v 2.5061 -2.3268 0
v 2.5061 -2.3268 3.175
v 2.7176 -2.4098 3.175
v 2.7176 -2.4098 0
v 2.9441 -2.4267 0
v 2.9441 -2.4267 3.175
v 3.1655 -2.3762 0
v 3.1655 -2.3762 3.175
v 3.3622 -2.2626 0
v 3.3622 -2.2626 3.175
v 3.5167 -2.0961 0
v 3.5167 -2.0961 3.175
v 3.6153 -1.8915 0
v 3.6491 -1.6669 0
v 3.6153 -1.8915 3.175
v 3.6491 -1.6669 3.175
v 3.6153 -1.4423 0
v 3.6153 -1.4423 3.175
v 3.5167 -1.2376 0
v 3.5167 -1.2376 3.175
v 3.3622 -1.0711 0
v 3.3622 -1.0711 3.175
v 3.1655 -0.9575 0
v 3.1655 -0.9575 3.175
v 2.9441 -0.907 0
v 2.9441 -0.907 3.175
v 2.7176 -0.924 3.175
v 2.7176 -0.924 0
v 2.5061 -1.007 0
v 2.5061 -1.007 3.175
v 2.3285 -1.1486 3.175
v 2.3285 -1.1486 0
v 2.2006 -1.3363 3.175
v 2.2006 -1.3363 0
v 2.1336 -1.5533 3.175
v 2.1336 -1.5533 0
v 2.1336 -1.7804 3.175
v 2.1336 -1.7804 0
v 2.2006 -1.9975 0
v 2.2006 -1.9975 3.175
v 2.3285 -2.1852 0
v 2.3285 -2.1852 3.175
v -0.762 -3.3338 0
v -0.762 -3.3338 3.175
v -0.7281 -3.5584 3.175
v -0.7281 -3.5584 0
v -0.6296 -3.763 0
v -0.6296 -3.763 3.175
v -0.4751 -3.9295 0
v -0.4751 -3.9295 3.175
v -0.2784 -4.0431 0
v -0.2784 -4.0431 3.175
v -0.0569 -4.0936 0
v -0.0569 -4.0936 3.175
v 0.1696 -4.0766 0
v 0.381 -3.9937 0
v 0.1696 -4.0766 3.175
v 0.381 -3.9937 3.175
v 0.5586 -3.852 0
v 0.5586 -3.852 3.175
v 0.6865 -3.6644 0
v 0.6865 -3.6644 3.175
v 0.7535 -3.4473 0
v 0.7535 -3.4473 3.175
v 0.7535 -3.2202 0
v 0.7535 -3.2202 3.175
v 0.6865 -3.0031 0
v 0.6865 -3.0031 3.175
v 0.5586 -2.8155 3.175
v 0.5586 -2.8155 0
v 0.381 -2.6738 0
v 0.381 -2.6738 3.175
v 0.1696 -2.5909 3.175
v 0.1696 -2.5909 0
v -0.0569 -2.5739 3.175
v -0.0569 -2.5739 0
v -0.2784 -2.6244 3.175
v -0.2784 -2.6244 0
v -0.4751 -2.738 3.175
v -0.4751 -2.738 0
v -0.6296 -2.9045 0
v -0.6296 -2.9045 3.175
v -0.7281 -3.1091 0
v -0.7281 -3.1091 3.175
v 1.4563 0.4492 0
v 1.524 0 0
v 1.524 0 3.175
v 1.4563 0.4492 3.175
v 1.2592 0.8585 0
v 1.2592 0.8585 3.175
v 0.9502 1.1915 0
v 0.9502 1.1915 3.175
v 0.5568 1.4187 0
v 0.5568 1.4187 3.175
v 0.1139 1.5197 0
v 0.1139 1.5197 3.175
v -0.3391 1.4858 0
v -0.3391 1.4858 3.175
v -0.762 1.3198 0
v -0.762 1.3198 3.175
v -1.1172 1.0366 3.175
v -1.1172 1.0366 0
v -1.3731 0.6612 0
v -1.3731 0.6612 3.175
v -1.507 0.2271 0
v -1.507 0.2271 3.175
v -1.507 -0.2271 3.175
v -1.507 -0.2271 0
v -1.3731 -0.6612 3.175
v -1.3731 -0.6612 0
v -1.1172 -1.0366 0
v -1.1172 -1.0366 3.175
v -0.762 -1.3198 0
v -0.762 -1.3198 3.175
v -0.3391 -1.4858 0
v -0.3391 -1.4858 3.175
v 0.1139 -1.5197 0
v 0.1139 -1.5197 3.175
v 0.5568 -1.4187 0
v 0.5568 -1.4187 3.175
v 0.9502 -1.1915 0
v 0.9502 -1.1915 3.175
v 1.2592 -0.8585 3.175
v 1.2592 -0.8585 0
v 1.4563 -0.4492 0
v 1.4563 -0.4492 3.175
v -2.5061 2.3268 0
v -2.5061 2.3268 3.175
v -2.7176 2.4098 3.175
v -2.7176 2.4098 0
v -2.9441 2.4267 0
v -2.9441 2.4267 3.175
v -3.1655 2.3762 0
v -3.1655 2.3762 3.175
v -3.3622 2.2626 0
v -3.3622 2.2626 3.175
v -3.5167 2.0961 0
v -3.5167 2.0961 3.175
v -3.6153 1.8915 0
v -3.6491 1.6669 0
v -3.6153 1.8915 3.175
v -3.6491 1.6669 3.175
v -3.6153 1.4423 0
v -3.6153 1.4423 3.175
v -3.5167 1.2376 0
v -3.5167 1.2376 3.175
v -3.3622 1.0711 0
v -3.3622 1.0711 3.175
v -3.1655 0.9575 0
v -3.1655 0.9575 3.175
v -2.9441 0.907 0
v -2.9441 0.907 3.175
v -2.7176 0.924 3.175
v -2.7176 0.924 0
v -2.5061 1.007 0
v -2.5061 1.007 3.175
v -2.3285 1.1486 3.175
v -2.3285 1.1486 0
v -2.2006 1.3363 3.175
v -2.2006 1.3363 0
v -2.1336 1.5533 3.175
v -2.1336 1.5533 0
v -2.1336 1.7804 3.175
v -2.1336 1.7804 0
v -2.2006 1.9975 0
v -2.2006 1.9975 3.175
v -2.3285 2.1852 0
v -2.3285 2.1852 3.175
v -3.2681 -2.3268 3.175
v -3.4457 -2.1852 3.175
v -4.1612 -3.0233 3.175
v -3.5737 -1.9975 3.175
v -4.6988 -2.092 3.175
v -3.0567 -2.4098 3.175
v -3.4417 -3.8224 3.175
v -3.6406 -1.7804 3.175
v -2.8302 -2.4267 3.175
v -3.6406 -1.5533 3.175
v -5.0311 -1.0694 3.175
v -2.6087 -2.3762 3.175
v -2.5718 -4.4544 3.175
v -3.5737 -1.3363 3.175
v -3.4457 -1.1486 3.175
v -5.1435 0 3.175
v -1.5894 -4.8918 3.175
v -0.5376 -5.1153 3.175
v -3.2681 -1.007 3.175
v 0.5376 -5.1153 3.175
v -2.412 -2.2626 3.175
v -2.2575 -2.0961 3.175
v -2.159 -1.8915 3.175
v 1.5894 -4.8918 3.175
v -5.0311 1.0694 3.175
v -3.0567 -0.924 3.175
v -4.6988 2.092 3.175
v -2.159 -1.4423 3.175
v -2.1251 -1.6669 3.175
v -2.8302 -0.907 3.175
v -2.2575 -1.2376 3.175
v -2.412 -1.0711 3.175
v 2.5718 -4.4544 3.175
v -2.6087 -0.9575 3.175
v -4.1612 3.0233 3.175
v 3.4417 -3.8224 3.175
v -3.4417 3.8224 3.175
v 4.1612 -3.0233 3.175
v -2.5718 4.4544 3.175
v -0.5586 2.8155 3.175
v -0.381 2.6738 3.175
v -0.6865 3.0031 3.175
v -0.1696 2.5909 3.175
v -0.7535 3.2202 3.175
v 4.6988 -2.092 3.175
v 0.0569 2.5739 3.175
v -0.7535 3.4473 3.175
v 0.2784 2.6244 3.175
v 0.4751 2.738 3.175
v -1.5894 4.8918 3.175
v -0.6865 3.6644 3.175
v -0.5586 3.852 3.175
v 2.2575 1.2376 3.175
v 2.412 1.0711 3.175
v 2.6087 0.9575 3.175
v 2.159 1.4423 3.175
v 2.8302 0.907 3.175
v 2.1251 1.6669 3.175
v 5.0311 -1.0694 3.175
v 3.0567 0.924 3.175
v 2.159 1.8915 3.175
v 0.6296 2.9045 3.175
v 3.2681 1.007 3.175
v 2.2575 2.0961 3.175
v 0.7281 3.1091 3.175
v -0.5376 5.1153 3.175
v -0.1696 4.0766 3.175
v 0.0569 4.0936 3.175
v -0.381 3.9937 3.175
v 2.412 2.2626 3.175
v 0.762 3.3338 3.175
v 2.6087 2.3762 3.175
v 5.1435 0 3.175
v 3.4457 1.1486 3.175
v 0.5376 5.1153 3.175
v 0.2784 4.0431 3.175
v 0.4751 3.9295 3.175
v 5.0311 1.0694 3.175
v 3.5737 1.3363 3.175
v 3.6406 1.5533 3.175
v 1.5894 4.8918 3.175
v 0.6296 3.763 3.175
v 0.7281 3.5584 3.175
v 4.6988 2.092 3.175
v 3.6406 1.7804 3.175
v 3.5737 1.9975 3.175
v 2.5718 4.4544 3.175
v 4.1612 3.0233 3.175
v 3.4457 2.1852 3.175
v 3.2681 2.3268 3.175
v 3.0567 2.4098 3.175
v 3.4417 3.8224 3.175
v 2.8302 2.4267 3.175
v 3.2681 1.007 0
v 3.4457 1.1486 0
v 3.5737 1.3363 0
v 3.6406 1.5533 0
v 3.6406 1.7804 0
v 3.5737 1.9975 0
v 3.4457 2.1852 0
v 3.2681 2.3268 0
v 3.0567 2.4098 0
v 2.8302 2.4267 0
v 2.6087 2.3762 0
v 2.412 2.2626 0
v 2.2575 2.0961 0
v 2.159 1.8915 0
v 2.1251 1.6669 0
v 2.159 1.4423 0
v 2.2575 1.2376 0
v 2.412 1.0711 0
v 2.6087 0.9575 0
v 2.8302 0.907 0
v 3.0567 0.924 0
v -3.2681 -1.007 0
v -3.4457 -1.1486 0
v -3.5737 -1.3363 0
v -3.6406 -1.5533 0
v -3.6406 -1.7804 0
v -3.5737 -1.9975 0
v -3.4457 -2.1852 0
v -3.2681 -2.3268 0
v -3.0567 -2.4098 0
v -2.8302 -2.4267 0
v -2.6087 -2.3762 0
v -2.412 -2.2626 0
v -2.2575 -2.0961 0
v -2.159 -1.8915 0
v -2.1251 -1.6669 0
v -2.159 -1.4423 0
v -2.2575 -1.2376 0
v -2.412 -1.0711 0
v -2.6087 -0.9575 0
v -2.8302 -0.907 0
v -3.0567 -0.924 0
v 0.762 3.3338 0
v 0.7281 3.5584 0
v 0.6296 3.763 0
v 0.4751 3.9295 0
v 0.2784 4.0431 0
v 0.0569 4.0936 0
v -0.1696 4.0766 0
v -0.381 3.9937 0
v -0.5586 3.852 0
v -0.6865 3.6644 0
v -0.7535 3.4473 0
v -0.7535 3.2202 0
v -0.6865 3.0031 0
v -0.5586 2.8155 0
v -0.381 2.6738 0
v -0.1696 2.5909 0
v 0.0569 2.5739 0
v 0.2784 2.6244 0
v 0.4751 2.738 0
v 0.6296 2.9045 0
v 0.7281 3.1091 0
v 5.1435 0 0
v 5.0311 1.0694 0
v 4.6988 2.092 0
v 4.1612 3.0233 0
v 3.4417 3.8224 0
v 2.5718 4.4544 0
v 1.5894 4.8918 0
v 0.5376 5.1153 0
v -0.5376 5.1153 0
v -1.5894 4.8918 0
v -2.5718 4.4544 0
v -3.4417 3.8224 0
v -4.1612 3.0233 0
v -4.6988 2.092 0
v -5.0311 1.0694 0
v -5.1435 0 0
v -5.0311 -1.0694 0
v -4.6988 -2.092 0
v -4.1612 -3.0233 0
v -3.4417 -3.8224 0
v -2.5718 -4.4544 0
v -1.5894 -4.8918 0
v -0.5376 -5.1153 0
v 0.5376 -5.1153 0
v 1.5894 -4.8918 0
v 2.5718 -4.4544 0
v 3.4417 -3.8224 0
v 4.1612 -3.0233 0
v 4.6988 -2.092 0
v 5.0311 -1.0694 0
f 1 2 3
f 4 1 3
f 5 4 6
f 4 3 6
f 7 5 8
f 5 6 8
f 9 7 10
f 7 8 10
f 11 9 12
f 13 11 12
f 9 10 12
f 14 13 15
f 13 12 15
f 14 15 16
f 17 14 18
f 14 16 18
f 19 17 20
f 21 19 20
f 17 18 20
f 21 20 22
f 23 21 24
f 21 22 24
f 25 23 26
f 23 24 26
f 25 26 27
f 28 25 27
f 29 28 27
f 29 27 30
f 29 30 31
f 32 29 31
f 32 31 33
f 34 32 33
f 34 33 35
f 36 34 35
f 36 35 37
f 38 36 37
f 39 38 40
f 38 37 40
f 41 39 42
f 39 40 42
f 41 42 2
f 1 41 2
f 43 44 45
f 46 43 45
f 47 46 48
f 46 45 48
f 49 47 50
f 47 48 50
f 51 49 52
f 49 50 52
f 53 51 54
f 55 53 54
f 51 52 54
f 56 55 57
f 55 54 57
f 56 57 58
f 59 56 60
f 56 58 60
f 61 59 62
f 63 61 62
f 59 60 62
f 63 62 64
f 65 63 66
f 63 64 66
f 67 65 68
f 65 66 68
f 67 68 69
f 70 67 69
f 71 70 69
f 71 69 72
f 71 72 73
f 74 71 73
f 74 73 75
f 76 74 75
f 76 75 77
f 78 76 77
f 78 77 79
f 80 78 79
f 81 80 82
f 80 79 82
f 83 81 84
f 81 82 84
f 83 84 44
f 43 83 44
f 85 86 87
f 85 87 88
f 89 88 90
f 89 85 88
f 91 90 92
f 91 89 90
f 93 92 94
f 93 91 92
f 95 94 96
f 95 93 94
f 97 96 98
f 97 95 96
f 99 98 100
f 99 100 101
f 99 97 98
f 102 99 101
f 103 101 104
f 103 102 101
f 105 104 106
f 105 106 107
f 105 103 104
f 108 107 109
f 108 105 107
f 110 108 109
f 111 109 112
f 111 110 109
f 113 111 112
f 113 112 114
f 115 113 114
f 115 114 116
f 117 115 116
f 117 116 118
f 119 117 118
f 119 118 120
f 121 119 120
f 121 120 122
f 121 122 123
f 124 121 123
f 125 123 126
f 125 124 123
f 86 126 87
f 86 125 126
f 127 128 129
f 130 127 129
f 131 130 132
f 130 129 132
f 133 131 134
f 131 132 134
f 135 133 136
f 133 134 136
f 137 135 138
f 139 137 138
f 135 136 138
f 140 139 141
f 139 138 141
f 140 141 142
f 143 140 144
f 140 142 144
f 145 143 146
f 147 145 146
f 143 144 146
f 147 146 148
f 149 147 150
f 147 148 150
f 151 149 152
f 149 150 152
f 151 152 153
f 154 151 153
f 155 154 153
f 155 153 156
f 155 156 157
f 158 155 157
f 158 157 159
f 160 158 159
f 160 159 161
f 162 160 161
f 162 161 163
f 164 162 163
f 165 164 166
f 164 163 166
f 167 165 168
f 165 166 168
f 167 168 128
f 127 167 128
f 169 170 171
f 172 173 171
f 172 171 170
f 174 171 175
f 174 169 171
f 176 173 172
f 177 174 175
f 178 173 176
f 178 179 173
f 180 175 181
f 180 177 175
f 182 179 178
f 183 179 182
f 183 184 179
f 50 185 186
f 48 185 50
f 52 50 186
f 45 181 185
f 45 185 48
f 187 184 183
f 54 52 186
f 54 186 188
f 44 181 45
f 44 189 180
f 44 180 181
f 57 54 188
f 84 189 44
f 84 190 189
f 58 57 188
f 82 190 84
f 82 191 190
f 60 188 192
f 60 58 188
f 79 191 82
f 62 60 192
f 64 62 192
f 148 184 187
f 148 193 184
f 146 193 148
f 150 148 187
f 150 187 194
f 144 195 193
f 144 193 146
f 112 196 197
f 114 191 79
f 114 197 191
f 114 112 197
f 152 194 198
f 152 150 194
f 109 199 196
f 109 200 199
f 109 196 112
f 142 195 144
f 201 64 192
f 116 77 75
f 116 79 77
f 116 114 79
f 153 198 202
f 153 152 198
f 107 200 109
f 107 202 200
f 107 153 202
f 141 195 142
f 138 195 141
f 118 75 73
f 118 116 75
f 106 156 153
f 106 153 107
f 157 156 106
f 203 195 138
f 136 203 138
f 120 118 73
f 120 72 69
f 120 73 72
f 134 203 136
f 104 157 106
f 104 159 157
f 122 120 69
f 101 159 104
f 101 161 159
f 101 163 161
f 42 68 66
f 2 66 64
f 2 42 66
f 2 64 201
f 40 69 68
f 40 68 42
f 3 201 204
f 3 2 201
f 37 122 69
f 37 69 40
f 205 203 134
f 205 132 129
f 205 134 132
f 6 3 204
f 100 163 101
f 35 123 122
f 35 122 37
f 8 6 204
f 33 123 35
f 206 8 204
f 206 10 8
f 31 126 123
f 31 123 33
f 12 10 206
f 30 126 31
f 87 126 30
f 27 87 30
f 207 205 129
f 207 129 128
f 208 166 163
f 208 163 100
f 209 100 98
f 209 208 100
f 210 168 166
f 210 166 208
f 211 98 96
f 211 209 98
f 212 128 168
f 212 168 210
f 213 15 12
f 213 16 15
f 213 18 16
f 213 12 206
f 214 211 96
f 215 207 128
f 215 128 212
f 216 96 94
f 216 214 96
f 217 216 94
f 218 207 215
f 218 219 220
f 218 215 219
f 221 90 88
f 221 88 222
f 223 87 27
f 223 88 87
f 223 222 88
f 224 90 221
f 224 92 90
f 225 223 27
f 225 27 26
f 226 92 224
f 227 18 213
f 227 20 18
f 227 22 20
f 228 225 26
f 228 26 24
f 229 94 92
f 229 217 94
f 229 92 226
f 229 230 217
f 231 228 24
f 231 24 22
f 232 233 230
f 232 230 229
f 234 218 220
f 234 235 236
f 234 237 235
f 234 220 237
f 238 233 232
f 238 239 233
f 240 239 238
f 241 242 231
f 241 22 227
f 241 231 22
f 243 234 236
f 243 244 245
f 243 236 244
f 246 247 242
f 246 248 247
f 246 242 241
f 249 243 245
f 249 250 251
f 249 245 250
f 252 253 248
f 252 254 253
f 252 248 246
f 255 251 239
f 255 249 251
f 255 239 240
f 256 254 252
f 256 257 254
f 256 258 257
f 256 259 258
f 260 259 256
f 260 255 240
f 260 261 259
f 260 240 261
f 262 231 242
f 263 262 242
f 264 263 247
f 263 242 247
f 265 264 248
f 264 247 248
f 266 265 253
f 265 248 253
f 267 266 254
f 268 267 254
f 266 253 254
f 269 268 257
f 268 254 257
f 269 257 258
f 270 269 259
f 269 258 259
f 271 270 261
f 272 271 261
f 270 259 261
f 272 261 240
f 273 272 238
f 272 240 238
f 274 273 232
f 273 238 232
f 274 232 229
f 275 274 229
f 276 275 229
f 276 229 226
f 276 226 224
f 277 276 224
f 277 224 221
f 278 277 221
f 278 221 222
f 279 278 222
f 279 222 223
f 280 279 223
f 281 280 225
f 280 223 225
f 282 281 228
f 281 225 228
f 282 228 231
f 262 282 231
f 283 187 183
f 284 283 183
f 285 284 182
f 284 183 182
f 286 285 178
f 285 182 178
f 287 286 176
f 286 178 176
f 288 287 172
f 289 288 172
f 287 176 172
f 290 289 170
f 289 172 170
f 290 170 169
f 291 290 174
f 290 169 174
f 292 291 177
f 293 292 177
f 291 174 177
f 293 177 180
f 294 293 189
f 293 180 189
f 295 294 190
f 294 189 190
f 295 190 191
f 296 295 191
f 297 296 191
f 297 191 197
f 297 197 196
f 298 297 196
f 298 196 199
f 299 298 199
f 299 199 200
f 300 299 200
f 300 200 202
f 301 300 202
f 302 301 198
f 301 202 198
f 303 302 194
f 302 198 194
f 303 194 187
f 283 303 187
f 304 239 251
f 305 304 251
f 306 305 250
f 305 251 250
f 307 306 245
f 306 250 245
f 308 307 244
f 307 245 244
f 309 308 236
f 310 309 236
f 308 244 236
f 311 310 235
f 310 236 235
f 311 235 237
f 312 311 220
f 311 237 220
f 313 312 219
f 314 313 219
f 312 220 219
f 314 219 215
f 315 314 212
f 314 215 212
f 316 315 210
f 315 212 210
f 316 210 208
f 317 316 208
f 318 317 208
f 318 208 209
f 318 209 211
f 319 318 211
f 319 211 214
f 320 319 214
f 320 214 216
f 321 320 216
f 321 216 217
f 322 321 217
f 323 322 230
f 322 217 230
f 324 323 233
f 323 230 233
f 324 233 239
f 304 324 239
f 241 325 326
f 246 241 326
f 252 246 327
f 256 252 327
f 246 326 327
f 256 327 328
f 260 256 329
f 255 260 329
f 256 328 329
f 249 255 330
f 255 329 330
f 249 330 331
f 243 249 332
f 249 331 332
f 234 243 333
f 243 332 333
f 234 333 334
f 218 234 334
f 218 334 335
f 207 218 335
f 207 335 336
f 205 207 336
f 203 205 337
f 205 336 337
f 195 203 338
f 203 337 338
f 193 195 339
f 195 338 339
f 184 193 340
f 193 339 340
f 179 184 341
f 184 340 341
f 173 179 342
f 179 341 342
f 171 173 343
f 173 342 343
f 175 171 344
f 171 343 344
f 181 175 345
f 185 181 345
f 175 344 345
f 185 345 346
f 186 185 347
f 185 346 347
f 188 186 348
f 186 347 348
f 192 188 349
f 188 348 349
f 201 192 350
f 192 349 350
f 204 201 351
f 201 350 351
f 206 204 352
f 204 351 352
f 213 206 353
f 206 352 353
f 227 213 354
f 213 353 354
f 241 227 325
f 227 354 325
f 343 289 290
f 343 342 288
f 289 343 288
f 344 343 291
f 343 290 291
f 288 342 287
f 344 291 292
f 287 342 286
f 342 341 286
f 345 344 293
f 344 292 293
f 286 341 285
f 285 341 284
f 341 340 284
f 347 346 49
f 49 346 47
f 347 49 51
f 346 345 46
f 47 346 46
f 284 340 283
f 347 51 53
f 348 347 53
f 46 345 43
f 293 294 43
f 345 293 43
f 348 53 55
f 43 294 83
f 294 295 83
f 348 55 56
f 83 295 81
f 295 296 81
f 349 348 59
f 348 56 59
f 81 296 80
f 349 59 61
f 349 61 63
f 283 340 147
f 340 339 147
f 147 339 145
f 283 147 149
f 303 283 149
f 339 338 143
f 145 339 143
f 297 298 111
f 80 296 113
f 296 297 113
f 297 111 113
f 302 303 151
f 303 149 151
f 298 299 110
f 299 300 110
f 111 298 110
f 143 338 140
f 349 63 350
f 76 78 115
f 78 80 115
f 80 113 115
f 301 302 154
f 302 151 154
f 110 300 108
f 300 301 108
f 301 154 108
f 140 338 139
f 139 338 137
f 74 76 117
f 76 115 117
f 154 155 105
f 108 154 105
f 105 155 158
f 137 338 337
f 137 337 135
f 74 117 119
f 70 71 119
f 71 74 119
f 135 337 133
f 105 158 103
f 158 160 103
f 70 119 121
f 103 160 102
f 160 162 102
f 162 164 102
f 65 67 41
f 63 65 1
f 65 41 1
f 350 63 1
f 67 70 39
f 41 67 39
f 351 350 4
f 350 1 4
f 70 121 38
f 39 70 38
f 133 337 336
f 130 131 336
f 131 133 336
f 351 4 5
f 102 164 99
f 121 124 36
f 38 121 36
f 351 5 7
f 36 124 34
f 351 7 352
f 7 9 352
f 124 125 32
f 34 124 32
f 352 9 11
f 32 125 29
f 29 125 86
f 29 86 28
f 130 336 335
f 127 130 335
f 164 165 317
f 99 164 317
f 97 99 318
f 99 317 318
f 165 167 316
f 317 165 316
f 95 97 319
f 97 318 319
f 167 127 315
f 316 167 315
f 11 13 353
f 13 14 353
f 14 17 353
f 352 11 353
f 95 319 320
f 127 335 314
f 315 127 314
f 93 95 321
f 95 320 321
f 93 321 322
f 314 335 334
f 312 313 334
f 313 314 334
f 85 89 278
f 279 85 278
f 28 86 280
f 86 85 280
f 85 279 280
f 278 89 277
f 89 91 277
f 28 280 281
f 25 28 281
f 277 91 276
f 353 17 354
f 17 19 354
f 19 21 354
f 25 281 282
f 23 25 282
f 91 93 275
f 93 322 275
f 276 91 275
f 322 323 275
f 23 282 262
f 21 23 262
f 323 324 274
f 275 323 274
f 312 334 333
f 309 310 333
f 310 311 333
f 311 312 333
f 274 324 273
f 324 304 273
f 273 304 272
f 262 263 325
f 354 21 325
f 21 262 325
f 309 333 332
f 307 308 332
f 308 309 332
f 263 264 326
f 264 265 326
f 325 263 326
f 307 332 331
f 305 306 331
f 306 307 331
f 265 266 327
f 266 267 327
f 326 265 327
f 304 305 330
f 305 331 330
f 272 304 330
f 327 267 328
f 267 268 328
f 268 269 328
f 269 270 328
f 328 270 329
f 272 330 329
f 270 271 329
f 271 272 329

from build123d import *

# Parameters (mm, degrees)
SKETCH1_R           = 5.1435
SKETCH1_R_2         = 1.524
BOSS_EXTRUDE1_DEPTH = 3.175
SKETCH2_R           = 0.762
CUT_EXTRUDE1_DEPTH  = 3.175
CIRPATTERN1_COUNT   = 6


with BuildPart() as part:
    # Sketch1 → Boss-Extrude1 (new body)
    with BuildSketch(Plane.XY):
        Circle(SKETCH1_R)
        Circle(SKETCH1_R_2, mode=Mode.SUBTRACT)
    extrude(amount=BOSS_EXTRUDE1_DEPTH)

    # Sketch2 → Cut-Extrude1 (cut)
    with BuildSketch(Plane.XY.offset(3.175)):
        with Locations((0, 3.33375)):
            Circle(SKETCH2_R)
    cut_extrude1 = extrude(amount=-CUT_EXTRUDE1_DEPTH, mode=Mode.SUBTRACT)

    # CirPattern1: Cut-Extrude1 ×6 about axis
    cirpattern1_axis = Axis((0, 0, 0), (0, 0, 1))
    for i in range(1, CIRPATTERN1_COUNT):
        add(cut_extrude1.rotate(cirpattern1_axis, i * 360 / CIRPATTERN1_COUNT), mode=Mode.SUBTRACT)


solid = part.part
